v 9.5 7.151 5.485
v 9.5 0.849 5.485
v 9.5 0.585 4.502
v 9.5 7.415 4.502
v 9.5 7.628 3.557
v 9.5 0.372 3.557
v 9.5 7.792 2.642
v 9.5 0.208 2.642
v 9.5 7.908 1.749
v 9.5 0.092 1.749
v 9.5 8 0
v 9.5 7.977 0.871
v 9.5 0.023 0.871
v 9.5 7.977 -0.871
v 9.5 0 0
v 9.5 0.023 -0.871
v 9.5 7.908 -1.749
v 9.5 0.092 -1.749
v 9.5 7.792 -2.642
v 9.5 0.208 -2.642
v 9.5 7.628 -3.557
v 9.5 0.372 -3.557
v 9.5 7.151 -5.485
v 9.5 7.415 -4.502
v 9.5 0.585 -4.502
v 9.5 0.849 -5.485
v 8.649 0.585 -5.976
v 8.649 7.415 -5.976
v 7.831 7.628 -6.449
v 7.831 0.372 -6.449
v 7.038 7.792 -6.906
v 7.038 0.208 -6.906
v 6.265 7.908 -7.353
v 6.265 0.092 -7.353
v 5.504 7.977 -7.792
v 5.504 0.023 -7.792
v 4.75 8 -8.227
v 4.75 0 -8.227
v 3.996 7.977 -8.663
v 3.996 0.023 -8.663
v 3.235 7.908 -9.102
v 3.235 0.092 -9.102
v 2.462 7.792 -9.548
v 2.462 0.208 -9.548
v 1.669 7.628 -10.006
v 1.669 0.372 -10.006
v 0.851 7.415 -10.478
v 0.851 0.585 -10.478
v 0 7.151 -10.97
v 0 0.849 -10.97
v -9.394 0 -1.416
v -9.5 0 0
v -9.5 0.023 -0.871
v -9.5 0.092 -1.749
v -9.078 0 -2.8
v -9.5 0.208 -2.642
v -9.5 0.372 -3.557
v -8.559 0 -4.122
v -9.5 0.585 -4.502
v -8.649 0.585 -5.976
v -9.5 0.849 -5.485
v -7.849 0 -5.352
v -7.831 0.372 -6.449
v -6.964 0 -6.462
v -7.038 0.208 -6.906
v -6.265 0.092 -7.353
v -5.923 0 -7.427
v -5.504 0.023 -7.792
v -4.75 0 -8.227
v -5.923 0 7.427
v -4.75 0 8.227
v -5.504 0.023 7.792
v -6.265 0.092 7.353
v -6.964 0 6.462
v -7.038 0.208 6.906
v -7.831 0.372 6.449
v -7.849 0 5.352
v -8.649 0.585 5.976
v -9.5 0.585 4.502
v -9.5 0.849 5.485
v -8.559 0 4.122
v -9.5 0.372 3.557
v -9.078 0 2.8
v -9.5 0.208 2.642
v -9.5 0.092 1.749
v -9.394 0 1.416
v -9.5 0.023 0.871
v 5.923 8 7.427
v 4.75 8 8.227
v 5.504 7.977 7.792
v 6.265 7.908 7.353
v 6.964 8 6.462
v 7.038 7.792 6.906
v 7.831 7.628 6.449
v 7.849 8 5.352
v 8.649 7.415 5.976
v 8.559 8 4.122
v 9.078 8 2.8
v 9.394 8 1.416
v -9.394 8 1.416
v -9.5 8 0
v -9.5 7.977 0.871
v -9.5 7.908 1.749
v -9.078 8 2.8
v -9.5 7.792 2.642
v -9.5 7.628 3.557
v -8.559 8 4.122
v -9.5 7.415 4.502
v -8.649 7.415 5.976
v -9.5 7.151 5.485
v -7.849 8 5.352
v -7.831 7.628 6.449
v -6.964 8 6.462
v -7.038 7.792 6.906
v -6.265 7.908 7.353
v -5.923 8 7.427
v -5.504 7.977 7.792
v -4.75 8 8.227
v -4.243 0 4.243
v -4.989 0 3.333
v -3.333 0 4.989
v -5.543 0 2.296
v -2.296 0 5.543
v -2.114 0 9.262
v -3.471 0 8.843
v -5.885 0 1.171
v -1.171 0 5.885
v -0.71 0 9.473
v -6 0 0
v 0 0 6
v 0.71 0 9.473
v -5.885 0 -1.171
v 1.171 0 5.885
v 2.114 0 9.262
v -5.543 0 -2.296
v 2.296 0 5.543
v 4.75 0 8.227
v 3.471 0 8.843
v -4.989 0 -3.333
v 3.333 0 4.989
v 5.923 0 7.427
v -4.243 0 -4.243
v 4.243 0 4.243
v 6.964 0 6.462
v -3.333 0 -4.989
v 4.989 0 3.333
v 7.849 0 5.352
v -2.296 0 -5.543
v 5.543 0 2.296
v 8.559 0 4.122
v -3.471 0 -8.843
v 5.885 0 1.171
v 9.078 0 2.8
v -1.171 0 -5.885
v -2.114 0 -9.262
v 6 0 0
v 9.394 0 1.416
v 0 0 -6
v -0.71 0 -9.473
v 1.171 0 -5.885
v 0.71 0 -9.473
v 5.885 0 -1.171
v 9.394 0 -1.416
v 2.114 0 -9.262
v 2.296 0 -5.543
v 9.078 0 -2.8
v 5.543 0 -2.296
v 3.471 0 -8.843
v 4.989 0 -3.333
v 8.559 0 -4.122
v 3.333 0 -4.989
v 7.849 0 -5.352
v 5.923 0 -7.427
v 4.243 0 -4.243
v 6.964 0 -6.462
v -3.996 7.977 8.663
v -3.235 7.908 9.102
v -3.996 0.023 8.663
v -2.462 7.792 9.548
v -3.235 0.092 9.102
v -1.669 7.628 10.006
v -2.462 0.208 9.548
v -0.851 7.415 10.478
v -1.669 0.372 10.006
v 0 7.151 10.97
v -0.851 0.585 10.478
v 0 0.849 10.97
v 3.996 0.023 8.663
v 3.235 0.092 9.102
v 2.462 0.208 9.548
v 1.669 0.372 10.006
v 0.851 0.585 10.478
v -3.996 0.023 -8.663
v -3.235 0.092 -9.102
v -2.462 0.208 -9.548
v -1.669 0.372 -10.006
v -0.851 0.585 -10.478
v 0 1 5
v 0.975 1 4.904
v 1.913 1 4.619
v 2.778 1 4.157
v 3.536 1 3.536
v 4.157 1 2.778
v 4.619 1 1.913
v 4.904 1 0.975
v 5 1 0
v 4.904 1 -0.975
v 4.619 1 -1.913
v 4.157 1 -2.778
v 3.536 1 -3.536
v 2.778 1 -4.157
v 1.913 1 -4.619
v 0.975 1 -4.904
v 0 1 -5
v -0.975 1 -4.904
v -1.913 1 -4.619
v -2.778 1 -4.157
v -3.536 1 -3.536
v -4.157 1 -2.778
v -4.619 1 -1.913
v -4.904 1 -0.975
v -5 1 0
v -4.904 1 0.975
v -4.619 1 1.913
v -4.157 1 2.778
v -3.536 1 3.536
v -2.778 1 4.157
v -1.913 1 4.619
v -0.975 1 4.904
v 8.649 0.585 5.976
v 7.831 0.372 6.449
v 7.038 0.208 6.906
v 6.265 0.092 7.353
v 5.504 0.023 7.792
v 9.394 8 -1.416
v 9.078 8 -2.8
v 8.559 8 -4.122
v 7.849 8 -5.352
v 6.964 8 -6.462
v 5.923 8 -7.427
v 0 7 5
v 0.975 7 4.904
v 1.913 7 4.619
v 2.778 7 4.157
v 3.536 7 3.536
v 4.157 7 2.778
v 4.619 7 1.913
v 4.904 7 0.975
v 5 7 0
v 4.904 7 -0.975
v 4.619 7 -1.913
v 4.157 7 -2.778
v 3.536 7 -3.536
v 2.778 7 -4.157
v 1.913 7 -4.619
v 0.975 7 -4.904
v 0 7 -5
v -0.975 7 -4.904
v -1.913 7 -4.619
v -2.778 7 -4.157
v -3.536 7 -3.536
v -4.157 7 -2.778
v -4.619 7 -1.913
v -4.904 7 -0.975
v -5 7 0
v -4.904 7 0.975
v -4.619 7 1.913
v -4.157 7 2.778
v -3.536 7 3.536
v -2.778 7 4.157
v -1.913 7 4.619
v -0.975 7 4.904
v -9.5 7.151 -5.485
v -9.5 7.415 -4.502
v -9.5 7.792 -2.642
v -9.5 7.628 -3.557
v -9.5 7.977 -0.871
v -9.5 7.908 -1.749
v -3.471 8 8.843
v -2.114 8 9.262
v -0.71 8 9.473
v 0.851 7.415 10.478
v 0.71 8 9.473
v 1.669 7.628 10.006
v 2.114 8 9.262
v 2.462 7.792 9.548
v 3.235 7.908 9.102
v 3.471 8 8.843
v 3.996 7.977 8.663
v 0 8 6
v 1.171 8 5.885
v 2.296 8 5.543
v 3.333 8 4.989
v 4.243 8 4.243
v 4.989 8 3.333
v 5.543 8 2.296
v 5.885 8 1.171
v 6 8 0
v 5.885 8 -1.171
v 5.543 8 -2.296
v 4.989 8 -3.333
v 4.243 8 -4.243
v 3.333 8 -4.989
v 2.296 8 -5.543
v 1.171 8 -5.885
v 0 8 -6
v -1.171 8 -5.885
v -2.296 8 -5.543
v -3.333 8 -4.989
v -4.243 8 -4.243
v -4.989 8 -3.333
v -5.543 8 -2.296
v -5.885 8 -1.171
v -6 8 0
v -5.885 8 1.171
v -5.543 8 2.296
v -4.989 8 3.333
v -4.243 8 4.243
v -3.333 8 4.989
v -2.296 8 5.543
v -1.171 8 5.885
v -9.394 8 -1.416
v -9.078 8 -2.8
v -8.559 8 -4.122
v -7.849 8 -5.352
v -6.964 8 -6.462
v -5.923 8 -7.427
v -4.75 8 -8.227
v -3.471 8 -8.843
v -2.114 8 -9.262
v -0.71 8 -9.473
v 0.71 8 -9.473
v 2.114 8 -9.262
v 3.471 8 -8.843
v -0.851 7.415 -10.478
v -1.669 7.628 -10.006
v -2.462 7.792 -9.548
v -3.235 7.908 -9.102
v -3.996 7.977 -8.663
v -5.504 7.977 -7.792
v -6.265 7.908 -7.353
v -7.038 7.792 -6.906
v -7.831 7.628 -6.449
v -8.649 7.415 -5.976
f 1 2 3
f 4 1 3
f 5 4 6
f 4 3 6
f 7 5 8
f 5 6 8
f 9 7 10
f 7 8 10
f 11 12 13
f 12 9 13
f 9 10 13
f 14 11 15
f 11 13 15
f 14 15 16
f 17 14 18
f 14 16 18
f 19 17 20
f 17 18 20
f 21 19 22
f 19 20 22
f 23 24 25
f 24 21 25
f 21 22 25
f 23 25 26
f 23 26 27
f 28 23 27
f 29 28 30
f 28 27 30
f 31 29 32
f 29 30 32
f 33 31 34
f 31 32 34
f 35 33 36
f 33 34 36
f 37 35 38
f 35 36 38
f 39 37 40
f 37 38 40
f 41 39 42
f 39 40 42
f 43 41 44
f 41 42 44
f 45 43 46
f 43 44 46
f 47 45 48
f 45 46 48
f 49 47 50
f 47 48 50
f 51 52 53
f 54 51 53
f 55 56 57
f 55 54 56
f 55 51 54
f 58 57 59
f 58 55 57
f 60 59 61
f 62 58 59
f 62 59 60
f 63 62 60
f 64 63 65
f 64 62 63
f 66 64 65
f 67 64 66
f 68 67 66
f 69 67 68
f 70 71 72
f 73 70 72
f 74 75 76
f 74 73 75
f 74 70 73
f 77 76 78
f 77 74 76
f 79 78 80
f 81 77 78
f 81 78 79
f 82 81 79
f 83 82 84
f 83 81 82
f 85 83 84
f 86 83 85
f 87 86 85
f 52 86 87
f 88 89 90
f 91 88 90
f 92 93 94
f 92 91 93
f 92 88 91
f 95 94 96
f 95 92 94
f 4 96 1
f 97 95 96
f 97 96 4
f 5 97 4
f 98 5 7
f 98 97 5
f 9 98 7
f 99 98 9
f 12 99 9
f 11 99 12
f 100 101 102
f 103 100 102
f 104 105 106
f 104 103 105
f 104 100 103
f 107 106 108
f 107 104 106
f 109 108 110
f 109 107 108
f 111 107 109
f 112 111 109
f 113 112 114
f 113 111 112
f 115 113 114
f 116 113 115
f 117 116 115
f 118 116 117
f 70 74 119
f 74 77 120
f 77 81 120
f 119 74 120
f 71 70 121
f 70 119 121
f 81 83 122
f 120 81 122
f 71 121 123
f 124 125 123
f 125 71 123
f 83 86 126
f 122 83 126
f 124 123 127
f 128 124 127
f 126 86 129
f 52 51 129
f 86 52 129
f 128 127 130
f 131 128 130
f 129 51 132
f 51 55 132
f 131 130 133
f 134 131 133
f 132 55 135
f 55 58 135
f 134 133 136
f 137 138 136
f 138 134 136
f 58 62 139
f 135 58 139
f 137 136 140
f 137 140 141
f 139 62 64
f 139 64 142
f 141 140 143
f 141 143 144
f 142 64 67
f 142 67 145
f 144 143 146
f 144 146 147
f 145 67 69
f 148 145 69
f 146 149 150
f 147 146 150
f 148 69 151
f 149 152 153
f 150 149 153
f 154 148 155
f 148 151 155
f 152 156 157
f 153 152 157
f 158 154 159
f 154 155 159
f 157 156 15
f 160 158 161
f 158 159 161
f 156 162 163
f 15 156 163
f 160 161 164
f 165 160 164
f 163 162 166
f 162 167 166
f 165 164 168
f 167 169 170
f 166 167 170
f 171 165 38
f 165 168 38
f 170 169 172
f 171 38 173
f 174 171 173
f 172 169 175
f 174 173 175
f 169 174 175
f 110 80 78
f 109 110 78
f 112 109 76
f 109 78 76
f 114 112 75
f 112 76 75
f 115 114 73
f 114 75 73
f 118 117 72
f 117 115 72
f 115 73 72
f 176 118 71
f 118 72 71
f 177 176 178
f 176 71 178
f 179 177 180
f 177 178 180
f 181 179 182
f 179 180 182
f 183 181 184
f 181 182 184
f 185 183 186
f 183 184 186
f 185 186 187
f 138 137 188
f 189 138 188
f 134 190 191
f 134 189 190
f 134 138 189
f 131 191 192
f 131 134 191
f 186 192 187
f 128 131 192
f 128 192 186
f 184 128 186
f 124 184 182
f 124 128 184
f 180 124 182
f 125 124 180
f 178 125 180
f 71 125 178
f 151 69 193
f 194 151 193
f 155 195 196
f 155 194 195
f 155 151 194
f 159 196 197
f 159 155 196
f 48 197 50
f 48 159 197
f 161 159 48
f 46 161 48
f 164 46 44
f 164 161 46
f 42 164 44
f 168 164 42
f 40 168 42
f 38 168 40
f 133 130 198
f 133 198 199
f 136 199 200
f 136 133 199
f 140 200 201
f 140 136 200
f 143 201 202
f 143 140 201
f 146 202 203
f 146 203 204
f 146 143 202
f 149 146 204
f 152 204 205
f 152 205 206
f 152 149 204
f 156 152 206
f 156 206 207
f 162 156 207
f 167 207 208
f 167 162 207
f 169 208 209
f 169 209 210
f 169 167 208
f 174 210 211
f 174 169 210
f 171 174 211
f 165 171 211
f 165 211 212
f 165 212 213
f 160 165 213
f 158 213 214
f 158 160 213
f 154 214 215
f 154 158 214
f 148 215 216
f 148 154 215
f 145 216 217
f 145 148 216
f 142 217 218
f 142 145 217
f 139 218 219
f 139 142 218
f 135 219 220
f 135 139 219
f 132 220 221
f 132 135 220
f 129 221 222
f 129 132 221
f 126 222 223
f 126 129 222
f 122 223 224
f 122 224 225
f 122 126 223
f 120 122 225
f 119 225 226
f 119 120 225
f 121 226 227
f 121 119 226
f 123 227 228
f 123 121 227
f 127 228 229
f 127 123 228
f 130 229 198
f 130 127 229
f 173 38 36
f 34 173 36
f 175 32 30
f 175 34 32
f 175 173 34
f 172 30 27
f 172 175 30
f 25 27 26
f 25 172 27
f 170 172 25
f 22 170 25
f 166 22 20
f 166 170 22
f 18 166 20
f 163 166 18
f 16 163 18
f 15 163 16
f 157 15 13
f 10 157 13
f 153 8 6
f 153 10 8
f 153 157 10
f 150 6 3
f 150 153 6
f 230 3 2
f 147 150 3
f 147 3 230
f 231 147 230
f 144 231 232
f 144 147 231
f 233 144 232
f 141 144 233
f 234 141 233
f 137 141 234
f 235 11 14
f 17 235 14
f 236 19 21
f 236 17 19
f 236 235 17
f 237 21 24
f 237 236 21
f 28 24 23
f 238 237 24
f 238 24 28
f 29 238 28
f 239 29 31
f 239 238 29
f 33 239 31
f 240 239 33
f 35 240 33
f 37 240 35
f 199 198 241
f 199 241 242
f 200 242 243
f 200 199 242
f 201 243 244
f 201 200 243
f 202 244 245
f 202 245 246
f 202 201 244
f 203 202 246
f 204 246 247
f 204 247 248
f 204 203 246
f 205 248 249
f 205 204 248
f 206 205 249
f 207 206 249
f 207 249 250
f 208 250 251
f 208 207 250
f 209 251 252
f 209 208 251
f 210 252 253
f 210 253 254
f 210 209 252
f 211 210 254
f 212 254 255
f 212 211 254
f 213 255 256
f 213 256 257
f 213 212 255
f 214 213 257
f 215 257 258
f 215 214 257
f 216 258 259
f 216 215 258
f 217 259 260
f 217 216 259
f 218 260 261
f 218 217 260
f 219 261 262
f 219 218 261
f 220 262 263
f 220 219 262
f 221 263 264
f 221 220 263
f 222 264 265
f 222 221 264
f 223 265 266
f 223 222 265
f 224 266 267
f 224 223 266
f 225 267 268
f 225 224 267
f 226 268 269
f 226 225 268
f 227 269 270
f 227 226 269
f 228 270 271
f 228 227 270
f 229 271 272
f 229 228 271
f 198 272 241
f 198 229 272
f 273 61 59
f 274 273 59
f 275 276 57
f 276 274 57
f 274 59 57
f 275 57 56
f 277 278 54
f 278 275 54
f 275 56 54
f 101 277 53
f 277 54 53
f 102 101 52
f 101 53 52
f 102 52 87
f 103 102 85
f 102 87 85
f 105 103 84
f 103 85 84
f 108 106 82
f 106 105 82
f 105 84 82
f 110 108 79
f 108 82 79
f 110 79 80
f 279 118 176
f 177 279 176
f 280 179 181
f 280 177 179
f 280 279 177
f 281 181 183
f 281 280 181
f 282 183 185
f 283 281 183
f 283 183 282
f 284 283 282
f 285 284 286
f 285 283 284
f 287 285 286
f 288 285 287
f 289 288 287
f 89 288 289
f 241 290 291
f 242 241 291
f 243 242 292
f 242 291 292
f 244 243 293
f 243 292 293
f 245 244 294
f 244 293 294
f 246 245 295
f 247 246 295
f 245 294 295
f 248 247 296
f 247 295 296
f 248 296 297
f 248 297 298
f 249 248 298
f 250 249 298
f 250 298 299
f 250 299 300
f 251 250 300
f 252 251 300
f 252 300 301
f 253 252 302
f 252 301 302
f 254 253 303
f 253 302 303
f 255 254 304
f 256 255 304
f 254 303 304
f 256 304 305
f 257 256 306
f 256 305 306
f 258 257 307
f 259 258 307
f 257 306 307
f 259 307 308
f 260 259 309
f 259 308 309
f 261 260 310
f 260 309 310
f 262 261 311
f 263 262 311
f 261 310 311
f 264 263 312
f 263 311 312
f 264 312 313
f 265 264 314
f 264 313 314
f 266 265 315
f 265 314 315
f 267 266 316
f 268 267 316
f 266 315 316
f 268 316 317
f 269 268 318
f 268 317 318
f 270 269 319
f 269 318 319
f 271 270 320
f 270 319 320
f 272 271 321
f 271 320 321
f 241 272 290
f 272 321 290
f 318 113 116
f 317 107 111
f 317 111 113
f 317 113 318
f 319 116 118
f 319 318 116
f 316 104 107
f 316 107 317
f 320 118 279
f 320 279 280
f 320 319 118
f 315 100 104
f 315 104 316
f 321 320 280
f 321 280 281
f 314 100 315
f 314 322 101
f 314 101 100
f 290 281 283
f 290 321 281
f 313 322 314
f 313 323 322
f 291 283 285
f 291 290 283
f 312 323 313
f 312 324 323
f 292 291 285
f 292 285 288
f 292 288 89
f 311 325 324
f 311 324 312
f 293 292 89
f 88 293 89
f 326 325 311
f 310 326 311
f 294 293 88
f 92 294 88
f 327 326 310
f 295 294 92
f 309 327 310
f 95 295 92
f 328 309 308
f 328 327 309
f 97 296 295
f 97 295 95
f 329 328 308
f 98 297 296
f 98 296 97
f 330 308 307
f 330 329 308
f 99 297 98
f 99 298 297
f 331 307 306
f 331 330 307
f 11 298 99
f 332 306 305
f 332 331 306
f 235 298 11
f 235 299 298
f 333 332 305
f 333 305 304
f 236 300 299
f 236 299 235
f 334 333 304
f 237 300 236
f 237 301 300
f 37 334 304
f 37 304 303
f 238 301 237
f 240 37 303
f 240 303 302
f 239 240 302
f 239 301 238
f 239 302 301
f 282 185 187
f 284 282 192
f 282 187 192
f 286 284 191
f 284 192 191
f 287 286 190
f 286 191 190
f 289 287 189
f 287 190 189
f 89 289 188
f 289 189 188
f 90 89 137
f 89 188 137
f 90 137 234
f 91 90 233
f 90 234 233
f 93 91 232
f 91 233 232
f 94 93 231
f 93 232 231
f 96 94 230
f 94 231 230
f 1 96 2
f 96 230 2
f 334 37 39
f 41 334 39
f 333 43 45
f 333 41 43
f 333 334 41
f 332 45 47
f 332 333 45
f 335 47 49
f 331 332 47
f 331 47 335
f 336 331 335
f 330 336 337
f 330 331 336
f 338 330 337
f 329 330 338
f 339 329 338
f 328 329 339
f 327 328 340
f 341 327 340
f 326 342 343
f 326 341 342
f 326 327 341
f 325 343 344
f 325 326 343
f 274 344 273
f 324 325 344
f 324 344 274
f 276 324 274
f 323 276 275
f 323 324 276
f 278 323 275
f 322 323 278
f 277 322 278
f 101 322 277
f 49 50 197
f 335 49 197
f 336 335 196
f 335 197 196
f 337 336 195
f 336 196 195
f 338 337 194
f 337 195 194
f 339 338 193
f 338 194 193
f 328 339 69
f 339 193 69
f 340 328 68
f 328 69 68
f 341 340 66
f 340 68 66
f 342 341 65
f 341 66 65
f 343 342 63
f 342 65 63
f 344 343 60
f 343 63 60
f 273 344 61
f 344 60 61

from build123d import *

# Parameters (mm, degrees)
SKETCH1_R           = 5
BOSS_EXTRUDE1_DEPTH = 8
CHAMFER1_SIZE       = 1
SKETCH2_OUTSIDE_W   = 54.734
SKETCH2_OUTSIDE_H   = 57.674
SKETCH2_OUTSIDE_R   = 9.5
CUT_EXTRUDE1_DEPTH  = 8
CUT_EXTRUDE1_DRAFT  = -60
SKETCH3_OUTSIDE_W   = 54.734
SKETCH3_OUTSIDE_H   = 57.674
SKETCH3_OUTSIDE_R   = 9.5
CUT_EXTRUDE2_DEPTH  = 8
CUT_EXTRUDE2_DRAFT  = -60


with BuildPart() as part:
    # Sketch1 → Boss-Extrude1 (new body)
    with BuildSketch(Plane(origin=(0, 0, 0), x_dir=(1, 0, 0), z_dir=(0, 1, 0))):
        Polygon((9.5, -5.484827557), (9.5, 5.484827557), (0, 10.969655115), (-9.5, 5.484827557), (-9.5, -5.484827557), (0, -10.969655115), align=None)
        with Locations(Location((0, 0, 0), (0, 0, 270))):
            Circle(SKETCH1_R, mode=Mode.SUBTRACT)
    extrude(amount=BOSS_EXTRUDE1_DEPTH)

    # Chamfer1
    chamfer1_edges = [part.edges().sort_by_distance(p)[0] for p in [
        (0, 0, -5),
        (0, 8, -5),
    ]]
    chamfer(chamfer1_edges, length=CHAMFER1_SIZE)


with BuildPart() as cut_extrude1_tool:
    # Sketch2 outside → Cut-Extrude1 (with draft: the straight prism first)
    with BuildSketch(Plane(origin=(0, 8, 0), x_dir=(1, 0, 0), z_dir=(0, 1, 0))):
        Rectangle(SKETCH2_OUTSIDE_W, SKETCH2_OUTSIDE_H)
        Circle(SKETCH2_OUTSIDE_R, mode=Mode.SUBTRACT)
    extrude(amount=-CUT_EXTRUDE1_DEPTH)
    # Cut-Extrude1: the draft: its side faces are tilted about the plane it starts from
    cut_extrude1_sides = [cut_extrude1_tool.faces().sort_by_distance(p)[0] for p in [
        (0, 4, 28.837),
        (27.367, 4, 0),
        (0, 4, -28.837),
        (-27.367, 4, 0),
        (-9.5, 4, 0),
    ]]
    draft(cut_extrude1_sides, Plane(origin=(0, 8, 0), x_dir=(1, 0, 0), z_dir=(0, 1, 0)), CUT_EXTRUDE1_DRAFT)


with BuildPart() as part_1:
    add(part.part)

    # Cut-Extrude1: cut by cut_extrude1_tool
    add(cut_extrude1_tool.part, mode=Mode.SUBTRACT)


with BuildPart() as cut_extrude2_tool:
    # Sketch3 outside → Cut-Extrude2 (with draft: the straight prism first)
    with BuildSketch(Plane.XZ):
        Rectangle(SKETCH3_OUTSIDE_W, SKETCH3_OUTSIDE_H)
        Circle(SKETCH3_OUTSIDE_R, mode=Mode.SUBTRACT)
    extrude(amount=-CUT_EXTRUDE2_DEPTH)
    # Cut-Extrude2: the draft: its side faces are tilted about the plane it starts from
    cut_extrude2_sides = [cut_extrude2_tool.faces().sort_by_distance(p)[0] for p in [
        (0, 4, -28.837),
        (27.367, 4, 0),
        (0, 4, 28.837),
        (-27.367, 4, 0),
        (-9.5, 4, 0),
    ]]
    draft(cut_extrude2_sides, Plane.XZ, CUT_EXTRUDE2_DRAFT)


with BuildPart() as part_2:
    add(part_1.part)

    # Cut-Extrude2: cut by cut_extrude2_tool
    add(cut_extrude2_tool.part, mode=Mode.SUBTRACT)


solid = part_2.part
